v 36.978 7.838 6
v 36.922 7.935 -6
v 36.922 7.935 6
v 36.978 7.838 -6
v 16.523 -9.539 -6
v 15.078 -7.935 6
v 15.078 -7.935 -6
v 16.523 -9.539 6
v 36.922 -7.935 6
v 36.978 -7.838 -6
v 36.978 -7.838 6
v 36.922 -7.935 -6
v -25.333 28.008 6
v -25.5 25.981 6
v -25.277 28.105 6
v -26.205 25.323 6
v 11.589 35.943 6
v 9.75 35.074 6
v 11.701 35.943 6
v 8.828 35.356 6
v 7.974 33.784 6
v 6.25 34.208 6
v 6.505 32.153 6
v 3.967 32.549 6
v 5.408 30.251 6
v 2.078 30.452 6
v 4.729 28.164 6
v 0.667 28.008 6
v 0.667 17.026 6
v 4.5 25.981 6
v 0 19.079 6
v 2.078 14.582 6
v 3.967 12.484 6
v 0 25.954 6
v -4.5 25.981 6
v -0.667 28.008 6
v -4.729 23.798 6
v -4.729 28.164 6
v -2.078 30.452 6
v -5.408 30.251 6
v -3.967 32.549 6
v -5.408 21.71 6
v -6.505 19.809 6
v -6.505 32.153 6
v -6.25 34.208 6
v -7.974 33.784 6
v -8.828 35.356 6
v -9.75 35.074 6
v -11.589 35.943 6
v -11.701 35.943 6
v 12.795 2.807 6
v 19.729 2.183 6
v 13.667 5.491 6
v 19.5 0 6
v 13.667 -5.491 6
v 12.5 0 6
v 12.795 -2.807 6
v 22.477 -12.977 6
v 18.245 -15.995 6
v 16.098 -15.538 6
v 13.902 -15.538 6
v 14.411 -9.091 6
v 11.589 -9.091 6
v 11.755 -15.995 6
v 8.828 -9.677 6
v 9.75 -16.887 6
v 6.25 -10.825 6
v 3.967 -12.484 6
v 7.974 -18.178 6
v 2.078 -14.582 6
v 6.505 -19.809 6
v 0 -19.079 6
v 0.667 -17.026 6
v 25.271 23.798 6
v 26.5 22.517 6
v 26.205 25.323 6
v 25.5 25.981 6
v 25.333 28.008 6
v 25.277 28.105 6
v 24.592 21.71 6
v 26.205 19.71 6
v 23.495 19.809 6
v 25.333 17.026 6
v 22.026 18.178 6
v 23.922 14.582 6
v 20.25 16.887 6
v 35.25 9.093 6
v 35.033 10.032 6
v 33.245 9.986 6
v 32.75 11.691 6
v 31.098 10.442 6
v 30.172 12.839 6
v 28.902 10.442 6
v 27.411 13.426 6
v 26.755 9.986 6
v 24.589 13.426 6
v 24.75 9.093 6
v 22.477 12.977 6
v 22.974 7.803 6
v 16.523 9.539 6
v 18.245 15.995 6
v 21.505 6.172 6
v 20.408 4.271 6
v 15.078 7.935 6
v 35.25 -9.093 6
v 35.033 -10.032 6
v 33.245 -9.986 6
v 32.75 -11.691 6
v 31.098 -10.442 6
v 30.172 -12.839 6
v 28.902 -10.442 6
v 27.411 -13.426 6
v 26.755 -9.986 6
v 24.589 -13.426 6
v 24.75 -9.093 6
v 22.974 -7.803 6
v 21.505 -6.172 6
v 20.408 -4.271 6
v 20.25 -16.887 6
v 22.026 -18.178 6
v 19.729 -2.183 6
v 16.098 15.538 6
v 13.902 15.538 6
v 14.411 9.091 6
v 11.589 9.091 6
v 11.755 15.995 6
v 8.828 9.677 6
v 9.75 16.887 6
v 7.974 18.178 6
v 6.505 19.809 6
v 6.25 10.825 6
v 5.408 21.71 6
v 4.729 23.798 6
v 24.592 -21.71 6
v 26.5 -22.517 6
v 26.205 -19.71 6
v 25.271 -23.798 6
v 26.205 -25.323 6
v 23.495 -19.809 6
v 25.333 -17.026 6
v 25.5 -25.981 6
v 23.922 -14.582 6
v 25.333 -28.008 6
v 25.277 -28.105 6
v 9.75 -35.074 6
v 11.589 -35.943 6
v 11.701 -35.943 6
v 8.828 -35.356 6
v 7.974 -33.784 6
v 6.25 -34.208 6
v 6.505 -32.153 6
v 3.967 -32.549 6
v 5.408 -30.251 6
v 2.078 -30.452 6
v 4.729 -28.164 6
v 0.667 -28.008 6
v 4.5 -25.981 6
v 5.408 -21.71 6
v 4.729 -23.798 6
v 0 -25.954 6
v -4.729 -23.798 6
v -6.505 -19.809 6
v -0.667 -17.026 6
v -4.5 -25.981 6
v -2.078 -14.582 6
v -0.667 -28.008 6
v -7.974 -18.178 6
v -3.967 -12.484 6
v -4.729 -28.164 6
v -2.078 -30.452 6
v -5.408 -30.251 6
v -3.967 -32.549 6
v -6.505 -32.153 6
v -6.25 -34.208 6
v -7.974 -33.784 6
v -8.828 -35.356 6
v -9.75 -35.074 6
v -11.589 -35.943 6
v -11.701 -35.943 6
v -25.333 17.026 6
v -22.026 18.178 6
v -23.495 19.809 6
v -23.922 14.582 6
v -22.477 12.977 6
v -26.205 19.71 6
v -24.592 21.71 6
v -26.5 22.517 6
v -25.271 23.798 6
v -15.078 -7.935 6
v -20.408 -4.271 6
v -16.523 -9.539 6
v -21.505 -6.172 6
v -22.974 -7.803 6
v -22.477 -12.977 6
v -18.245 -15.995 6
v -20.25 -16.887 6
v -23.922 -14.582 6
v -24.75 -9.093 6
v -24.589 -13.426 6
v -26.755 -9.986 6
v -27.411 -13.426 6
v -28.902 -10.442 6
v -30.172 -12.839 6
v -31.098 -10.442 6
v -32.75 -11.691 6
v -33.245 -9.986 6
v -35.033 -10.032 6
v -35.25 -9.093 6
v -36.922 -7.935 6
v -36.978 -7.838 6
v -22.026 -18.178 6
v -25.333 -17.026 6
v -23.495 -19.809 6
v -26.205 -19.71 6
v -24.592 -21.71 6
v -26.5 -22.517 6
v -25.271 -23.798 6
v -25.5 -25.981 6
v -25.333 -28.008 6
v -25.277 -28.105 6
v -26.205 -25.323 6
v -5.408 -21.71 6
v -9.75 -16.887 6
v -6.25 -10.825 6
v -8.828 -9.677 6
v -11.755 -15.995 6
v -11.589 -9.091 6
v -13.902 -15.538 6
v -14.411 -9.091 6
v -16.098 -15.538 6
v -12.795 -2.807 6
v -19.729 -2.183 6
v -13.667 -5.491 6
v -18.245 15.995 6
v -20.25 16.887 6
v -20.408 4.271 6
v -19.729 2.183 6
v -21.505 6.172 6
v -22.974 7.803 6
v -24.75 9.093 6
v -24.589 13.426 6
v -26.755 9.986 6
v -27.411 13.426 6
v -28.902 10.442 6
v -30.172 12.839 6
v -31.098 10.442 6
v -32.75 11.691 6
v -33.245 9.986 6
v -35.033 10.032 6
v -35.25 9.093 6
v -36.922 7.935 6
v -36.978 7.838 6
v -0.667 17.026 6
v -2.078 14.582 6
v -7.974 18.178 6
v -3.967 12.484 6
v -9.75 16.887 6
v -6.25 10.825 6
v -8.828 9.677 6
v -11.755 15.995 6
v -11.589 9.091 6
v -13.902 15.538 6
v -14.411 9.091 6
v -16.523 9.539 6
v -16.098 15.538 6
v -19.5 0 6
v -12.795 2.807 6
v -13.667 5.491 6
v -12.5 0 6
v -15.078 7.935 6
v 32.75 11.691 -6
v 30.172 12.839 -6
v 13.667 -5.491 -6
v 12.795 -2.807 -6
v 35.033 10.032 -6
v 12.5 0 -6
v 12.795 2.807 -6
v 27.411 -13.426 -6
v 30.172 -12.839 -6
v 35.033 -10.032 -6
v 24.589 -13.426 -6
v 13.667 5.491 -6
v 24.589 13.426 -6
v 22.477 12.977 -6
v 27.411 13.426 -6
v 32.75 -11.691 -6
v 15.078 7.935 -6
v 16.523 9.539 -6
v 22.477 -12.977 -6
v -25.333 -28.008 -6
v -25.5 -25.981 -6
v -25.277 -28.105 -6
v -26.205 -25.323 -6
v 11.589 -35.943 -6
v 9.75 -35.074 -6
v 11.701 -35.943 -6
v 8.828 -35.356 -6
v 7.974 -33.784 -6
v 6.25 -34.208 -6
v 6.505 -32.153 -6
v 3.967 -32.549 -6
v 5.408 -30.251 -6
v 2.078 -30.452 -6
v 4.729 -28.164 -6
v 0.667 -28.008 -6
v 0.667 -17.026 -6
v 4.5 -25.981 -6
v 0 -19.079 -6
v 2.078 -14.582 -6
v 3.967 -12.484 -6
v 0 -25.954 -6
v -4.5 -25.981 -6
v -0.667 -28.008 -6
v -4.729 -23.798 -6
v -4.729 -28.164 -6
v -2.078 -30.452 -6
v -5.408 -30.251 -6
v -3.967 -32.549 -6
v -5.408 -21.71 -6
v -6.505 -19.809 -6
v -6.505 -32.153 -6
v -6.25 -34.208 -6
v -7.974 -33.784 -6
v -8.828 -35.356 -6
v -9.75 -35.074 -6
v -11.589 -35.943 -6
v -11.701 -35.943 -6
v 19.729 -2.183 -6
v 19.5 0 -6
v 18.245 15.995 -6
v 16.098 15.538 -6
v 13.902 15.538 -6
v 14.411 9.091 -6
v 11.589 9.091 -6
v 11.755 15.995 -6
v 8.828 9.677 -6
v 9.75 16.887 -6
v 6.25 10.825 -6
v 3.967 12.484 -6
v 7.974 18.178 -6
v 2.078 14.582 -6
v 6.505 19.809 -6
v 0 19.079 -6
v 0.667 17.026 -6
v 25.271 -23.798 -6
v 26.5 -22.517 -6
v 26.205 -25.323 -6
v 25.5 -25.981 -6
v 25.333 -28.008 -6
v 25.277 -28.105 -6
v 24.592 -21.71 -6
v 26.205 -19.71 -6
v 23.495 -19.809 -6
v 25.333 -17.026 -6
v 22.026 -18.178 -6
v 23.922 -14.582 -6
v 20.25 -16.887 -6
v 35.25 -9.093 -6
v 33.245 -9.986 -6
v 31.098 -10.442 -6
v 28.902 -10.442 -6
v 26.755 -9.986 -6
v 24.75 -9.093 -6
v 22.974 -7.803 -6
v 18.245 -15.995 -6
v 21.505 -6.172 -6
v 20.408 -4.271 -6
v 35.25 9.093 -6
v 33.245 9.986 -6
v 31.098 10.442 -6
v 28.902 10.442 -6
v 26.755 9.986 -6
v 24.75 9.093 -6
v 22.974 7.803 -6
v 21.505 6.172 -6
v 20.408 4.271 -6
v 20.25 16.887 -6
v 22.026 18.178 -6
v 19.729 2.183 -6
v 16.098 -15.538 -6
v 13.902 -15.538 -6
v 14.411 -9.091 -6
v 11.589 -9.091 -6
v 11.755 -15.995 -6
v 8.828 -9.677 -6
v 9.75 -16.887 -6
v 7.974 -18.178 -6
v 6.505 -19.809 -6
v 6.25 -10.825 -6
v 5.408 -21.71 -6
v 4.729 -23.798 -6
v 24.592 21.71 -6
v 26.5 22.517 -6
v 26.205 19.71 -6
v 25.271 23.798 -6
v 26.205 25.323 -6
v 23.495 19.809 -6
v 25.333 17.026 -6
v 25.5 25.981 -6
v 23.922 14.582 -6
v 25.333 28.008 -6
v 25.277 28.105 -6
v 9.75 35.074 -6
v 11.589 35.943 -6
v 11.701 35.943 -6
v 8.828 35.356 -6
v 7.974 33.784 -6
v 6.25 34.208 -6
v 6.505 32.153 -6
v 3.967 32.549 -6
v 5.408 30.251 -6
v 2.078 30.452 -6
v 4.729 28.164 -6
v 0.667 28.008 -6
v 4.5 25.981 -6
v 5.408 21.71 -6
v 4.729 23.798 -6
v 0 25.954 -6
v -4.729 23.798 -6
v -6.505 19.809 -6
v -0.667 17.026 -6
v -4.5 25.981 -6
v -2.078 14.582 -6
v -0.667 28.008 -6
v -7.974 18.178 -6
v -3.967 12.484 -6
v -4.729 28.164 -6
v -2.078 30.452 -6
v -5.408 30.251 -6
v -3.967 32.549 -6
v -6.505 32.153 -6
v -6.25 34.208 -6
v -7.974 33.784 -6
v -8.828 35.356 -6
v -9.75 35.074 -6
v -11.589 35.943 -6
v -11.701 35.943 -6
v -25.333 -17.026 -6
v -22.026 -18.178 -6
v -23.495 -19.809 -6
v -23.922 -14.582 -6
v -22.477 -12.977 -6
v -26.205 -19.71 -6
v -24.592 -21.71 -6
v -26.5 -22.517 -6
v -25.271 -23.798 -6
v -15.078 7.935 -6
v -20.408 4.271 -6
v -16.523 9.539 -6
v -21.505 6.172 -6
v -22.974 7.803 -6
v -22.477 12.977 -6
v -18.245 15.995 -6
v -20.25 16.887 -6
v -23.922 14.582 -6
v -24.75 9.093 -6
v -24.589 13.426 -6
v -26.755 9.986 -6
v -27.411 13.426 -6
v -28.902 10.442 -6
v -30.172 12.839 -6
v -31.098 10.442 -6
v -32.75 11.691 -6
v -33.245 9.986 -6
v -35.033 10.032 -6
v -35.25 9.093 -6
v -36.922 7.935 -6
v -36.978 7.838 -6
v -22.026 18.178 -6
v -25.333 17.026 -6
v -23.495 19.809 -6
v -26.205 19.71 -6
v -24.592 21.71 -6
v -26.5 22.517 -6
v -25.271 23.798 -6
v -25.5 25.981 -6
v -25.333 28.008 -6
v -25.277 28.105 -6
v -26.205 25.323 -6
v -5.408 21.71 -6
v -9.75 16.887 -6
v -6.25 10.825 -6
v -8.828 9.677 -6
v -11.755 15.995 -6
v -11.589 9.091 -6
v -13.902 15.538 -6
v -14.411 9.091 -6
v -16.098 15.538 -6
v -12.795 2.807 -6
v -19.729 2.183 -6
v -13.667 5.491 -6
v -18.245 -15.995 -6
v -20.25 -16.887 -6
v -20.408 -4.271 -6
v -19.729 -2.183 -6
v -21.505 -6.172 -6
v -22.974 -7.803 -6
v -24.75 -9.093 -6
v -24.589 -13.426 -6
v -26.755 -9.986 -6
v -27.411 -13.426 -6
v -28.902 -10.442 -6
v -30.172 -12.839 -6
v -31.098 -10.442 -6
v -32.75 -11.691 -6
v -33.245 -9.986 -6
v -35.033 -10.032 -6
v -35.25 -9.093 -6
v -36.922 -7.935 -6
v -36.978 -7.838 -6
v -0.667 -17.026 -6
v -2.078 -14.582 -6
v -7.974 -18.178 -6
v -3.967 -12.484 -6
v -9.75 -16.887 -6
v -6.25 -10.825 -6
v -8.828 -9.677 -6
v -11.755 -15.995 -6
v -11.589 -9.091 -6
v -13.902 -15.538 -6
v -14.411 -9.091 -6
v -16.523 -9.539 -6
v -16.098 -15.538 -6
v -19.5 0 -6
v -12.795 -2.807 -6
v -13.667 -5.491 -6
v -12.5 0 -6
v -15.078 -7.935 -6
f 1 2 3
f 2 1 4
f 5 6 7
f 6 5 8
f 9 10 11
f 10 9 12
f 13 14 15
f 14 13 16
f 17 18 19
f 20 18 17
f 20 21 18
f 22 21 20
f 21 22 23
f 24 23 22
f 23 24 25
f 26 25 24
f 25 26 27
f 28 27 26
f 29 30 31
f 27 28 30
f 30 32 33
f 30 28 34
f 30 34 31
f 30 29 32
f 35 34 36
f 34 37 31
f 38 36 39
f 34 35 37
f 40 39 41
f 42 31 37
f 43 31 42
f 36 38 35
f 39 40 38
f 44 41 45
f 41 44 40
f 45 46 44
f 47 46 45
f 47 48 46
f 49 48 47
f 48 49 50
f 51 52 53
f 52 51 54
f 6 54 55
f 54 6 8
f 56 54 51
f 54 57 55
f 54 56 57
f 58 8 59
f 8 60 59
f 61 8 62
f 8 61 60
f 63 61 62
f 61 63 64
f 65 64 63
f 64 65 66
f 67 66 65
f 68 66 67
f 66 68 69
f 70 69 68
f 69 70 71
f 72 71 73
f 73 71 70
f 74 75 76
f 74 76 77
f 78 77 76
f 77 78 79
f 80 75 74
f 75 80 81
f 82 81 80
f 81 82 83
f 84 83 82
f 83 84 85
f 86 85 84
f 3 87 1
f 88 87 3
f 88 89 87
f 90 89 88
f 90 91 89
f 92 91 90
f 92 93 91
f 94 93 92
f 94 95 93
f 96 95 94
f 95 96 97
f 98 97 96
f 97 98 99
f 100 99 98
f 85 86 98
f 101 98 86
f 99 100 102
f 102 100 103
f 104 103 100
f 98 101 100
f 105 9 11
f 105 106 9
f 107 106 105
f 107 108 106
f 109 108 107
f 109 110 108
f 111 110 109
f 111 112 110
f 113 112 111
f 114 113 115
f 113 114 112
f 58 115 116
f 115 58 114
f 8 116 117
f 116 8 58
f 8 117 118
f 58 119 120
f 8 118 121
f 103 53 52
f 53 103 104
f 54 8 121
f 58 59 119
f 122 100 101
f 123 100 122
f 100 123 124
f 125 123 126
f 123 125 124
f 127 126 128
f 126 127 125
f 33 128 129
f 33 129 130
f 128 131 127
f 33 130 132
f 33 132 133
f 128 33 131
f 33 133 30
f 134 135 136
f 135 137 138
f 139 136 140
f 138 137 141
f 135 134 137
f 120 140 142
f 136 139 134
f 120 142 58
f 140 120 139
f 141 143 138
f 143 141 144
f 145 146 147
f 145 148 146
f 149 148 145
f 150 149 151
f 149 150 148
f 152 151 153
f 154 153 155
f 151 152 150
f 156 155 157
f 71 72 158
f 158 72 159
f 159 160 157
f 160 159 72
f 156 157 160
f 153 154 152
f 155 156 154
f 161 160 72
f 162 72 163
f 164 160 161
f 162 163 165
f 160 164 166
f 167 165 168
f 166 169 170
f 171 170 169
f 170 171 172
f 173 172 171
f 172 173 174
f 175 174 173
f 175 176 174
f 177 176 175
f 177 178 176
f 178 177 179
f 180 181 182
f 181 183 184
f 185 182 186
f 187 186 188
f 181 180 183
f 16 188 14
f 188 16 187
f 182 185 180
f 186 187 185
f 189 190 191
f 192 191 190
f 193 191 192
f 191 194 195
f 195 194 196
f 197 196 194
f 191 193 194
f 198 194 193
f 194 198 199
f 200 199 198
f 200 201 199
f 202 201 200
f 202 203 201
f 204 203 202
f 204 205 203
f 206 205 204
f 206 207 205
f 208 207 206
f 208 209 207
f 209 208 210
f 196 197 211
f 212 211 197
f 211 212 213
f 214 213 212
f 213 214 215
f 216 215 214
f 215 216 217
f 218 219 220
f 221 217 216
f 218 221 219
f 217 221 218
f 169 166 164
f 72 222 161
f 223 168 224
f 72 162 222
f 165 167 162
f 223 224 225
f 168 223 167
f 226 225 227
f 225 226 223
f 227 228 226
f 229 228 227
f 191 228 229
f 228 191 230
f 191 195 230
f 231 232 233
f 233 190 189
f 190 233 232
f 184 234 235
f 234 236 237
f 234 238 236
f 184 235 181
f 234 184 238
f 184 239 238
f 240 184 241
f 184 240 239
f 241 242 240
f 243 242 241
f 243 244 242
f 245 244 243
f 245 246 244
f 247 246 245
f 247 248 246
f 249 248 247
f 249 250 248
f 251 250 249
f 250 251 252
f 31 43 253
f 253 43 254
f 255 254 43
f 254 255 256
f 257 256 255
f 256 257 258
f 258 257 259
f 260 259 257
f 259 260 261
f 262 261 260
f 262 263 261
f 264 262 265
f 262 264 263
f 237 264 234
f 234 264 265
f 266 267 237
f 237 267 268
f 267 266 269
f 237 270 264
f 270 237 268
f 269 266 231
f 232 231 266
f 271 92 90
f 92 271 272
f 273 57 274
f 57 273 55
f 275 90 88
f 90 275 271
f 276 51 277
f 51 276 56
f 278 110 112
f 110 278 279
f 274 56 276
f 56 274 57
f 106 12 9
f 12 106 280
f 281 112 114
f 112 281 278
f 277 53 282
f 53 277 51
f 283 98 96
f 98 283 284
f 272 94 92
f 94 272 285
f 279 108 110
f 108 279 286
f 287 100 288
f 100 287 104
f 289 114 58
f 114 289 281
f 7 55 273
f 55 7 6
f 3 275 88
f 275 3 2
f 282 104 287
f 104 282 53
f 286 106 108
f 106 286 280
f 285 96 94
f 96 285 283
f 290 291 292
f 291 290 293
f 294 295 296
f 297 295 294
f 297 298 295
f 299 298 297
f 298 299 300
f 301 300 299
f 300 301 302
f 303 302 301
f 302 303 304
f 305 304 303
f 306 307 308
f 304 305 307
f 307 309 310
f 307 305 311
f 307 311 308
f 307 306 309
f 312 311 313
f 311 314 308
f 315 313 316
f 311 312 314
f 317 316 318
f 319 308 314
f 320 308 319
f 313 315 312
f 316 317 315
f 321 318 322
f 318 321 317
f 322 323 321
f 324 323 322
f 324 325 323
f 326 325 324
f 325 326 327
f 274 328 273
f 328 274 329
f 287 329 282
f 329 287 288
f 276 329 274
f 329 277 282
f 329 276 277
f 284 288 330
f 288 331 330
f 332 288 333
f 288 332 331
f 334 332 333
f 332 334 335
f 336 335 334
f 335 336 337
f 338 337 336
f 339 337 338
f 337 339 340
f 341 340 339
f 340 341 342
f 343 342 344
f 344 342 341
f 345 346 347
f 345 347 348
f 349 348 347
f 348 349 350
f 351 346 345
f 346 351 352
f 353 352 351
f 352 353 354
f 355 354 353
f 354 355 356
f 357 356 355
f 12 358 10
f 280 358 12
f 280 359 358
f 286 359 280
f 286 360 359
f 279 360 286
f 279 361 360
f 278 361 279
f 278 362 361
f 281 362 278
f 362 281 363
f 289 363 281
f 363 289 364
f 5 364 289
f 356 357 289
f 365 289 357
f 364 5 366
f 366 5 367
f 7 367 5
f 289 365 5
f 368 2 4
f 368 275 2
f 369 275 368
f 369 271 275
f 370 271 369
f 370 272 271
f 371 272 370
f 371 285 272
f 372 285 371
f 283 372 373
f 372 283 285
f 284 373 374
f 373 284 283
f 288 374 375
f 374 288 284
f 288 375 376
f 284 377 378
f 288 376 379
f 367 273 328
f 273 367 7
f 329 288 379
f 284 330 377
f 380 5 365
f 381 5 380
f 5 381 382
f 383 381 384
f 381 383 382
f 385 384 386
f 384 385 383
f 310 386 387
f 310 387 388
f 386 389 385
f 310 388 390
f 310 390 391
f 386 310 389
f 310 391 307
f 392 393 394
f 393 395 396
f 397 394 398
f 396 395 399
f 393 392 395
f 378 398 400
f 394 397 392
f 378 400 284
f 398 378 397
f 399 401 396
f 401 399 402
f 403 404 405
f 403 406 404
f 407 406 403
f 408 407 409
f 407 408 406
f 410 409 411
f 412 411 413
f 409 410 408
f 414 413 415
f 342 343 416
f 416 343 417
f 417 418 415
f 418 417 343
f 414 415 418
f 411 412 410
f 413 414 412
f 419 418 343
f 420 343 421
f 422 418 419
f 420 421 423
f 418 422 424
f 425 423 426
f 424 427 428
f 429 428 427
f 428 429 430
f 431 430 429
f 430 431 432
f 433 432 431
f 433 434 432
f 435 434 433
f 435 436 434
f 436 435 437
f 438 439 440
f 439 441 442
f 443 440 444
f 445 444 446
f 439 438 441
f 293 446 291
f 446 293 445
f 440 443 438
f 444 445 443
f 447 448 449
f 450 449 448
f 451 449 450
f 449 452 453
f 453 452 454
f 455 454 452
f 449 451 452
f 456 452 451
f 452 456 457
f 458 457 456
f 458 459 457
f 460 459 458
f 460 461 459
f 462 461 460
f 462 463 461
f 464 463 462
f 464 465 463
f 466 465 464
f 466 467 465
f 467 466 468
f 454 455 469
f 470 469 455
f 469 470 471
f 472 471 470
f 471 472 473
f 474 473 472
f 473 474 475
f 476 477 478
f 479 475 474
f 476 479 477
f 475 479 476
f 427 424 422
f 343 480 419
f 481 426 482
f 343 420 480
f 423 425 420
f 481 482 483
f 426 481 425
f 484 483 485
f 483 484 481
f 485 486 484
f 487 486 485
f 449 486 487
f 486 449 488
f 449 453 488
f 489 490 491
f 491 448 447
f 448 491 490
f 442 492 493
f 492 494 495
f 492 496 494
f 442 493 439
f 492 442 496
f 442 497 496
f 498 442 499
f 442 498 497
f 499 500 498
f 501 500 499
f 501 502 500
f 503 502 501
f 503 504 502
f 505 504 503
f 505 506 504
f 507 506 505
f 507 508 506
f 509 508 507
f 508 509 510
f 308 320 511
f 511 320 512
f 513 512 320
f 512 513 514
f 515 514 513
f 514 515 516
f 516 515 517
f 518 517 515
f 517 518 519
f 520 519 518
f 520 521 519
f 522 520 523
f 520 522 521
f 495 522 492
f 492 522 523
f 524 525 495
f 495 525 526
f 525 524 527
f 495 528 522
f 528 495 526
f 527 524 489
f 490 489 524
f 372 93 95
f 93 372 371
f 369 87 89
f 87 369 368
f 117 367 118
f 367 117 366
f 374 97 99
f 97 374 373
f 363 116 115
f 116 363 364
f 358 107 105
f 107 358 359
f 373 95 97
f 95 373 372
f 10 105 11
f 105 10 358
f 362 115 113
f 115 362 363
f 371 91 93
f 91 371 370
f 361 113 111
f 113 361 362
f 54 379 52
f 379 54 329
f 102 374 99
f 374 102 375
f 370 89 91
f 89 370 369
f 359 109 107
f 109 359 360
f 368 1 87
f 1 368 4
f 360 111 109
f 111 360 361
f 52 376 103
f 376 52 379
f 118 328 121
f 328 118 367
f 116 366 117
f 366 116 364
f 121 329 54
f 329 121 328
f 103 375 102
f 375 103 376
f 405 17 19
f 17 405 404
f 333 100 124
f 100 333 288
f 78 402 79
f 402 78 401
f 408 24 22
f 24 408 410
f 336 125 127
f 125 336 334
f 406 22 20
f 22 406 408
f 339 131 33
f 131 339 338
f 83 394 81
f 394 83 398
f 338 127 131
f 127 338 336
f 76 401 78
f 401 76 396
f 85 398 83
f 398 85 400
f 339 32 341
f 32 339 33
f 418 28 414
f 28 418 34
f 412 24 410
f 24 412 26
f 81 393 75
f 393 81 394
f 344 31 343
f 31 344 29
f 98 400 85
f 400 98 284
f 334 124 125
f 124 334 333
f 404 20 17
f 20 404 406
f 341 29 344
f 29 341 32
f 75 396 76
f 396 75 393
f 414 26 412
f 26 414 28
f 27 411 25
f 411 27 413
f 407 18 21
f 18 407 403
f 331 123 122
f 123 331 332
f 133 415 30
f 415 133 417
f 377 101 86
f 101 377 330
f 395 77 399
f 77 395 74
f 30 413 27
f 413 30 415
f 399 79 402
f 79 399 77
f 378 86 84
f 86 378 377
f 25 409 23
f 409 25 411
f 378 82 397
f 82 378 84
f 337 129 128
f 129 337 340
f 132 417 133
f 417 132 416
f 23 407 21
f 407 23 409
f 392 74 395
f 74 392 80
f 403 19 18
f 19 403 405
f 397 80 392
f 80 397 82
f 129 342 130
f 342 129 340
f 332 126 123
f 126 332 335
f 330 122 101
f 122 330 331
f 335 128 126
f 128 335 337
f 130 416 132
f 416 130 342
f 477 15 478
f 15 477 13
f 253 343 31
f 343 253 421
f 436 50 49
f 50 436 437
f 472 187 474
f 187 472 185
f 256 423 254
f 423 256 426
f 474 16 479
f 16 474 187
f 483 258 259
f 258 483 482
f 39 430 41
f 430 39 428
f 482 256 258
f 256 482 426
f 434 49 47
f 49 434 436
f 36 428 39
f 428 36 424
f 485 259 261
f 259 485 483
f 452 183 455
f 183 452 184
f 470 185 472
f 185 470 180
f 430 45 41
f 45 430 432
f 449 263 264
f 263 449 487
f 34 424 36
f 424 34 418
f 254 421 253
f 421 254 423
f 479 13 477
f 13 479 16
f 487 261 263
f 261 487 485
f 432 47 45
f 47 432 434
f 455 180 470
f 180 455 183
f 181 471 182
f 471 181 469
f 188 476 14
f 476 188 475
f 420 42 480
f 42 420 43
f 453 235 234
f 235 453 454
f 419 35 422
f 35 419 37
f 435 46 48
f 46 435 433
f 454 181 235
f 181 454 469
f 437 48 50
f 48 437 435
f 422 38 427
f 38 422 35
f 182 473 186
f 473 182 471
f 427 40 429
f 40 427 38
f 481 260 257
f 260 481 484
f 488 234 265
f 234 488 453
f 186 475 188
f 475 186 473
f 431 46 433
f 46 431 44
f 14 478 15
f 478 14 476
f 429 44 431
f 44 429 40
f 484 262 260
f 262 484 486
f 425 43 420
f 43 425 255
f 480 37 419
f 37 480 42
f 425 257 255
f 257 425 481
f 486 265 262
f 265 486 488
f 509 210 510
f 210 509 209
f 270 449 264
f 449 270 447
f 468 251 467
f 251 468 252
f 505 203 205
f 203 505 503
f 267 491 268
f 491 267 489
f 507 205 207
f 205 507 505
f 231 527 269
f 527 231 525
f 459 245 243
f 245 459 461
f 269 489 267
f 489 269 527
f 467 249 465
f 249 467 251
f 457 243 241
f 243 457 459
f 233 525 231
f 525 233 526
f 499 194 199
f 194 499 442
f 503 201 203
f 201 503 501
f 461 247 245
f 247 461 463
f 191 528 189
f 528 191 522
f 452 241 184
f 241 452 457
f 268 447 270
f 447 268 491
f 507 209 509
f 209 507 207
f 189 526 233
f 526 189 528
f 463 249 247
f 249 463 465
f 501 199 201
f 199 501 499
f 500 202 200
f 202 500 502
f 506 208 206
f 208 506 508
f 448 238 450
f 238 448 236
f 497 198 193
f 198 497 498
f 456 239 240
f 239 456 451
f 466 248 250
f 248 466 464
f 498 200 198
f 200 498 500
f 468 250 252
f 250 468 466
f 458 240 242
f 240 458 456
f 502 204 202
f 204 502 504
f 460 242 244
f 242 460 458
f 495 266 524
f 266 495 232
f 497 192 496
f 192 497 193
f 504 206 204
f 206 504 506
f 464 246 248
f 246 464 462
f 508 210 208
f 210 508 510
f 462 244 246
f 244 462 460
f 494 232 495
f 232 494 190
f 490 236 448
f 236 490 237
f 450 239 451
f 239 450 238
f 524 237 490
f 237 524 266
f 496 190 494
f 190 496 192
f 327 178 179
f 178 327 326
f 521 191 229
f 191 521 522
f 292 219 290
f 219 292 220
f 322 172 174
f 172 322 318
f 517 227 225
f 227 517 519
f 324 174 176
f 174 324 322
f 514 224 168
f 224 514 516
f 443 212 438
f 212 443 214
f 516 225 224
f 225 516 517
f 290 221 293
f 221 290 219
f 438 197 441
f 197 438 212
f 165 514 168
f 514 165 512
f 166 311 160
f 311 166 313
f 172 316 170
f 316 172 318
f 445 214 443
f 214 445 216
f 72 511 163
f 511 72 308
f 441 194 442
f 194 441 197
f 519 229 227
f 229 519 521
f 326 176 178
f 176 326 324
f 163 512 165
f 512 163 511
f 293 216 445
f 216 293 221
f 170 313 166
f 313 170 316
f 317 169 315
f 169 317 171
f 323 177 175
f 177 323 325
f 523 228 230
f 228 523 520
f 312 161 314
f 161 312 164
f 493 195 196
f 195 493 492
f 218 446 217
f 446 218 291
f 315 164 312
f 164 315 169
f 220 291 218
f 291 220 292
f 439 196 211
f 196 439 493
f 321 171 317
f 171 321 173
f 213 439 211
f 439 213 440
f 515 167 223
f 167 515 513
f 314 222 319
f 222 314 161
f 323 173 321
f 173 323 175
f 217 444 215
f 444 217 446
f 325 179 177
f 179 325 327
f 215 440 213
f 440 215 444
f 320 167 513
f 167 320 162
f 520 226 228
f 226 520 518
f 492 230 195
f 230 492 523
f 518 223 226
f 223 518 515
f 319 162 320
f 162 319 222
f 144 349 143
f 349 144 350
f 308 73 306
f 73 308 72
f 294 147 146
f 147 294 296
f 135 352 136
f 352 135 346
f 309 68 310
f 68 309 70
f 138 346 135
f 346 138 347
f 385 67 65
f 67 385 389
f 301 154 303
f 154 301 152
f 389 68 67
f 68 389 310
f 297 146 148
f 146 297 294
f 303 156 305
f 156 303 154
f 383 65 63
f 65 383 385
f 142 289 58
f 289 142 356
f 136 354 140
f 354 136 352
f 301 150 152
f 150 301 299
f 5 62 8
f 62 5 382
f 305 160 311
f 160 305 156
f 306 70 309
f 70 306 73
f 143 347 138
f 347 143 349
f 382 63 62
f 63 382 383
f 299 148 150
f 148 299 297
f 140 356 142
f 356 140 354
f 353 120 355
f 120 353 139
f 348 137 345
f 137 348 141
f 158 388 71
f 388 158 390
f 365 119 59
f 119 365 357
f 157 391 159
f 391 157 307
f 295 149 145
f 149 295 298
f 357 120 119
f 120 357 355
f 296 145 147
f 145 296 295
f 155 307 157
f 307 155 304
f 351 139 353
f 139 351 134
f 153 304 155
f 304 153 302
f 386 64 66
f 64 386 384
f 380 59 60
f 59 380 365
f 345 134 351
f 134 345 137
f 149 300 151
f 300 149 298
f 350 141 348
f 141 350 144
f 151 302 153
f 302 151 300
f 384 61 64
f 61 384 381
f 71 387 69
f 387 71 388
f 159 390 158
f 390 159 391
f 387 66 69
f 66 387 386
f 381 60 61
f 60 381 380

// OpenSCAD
module insert( height = 12, inside = 10.5, outside = 13.5 )
{
    d = (outside - inside) + 1;
    
    difference() {
        cylinder( r=outside, h = height, center = true );
        translate( [d, 0, 0] )
        cylinder( r = inside, h = height + 1, center = true);
    }
}

for ( n = [0 : 5] ) {
    rotate( [ 0, 0, n * 60 ] )
    translate( [26,0,0] )
    insert();
}
